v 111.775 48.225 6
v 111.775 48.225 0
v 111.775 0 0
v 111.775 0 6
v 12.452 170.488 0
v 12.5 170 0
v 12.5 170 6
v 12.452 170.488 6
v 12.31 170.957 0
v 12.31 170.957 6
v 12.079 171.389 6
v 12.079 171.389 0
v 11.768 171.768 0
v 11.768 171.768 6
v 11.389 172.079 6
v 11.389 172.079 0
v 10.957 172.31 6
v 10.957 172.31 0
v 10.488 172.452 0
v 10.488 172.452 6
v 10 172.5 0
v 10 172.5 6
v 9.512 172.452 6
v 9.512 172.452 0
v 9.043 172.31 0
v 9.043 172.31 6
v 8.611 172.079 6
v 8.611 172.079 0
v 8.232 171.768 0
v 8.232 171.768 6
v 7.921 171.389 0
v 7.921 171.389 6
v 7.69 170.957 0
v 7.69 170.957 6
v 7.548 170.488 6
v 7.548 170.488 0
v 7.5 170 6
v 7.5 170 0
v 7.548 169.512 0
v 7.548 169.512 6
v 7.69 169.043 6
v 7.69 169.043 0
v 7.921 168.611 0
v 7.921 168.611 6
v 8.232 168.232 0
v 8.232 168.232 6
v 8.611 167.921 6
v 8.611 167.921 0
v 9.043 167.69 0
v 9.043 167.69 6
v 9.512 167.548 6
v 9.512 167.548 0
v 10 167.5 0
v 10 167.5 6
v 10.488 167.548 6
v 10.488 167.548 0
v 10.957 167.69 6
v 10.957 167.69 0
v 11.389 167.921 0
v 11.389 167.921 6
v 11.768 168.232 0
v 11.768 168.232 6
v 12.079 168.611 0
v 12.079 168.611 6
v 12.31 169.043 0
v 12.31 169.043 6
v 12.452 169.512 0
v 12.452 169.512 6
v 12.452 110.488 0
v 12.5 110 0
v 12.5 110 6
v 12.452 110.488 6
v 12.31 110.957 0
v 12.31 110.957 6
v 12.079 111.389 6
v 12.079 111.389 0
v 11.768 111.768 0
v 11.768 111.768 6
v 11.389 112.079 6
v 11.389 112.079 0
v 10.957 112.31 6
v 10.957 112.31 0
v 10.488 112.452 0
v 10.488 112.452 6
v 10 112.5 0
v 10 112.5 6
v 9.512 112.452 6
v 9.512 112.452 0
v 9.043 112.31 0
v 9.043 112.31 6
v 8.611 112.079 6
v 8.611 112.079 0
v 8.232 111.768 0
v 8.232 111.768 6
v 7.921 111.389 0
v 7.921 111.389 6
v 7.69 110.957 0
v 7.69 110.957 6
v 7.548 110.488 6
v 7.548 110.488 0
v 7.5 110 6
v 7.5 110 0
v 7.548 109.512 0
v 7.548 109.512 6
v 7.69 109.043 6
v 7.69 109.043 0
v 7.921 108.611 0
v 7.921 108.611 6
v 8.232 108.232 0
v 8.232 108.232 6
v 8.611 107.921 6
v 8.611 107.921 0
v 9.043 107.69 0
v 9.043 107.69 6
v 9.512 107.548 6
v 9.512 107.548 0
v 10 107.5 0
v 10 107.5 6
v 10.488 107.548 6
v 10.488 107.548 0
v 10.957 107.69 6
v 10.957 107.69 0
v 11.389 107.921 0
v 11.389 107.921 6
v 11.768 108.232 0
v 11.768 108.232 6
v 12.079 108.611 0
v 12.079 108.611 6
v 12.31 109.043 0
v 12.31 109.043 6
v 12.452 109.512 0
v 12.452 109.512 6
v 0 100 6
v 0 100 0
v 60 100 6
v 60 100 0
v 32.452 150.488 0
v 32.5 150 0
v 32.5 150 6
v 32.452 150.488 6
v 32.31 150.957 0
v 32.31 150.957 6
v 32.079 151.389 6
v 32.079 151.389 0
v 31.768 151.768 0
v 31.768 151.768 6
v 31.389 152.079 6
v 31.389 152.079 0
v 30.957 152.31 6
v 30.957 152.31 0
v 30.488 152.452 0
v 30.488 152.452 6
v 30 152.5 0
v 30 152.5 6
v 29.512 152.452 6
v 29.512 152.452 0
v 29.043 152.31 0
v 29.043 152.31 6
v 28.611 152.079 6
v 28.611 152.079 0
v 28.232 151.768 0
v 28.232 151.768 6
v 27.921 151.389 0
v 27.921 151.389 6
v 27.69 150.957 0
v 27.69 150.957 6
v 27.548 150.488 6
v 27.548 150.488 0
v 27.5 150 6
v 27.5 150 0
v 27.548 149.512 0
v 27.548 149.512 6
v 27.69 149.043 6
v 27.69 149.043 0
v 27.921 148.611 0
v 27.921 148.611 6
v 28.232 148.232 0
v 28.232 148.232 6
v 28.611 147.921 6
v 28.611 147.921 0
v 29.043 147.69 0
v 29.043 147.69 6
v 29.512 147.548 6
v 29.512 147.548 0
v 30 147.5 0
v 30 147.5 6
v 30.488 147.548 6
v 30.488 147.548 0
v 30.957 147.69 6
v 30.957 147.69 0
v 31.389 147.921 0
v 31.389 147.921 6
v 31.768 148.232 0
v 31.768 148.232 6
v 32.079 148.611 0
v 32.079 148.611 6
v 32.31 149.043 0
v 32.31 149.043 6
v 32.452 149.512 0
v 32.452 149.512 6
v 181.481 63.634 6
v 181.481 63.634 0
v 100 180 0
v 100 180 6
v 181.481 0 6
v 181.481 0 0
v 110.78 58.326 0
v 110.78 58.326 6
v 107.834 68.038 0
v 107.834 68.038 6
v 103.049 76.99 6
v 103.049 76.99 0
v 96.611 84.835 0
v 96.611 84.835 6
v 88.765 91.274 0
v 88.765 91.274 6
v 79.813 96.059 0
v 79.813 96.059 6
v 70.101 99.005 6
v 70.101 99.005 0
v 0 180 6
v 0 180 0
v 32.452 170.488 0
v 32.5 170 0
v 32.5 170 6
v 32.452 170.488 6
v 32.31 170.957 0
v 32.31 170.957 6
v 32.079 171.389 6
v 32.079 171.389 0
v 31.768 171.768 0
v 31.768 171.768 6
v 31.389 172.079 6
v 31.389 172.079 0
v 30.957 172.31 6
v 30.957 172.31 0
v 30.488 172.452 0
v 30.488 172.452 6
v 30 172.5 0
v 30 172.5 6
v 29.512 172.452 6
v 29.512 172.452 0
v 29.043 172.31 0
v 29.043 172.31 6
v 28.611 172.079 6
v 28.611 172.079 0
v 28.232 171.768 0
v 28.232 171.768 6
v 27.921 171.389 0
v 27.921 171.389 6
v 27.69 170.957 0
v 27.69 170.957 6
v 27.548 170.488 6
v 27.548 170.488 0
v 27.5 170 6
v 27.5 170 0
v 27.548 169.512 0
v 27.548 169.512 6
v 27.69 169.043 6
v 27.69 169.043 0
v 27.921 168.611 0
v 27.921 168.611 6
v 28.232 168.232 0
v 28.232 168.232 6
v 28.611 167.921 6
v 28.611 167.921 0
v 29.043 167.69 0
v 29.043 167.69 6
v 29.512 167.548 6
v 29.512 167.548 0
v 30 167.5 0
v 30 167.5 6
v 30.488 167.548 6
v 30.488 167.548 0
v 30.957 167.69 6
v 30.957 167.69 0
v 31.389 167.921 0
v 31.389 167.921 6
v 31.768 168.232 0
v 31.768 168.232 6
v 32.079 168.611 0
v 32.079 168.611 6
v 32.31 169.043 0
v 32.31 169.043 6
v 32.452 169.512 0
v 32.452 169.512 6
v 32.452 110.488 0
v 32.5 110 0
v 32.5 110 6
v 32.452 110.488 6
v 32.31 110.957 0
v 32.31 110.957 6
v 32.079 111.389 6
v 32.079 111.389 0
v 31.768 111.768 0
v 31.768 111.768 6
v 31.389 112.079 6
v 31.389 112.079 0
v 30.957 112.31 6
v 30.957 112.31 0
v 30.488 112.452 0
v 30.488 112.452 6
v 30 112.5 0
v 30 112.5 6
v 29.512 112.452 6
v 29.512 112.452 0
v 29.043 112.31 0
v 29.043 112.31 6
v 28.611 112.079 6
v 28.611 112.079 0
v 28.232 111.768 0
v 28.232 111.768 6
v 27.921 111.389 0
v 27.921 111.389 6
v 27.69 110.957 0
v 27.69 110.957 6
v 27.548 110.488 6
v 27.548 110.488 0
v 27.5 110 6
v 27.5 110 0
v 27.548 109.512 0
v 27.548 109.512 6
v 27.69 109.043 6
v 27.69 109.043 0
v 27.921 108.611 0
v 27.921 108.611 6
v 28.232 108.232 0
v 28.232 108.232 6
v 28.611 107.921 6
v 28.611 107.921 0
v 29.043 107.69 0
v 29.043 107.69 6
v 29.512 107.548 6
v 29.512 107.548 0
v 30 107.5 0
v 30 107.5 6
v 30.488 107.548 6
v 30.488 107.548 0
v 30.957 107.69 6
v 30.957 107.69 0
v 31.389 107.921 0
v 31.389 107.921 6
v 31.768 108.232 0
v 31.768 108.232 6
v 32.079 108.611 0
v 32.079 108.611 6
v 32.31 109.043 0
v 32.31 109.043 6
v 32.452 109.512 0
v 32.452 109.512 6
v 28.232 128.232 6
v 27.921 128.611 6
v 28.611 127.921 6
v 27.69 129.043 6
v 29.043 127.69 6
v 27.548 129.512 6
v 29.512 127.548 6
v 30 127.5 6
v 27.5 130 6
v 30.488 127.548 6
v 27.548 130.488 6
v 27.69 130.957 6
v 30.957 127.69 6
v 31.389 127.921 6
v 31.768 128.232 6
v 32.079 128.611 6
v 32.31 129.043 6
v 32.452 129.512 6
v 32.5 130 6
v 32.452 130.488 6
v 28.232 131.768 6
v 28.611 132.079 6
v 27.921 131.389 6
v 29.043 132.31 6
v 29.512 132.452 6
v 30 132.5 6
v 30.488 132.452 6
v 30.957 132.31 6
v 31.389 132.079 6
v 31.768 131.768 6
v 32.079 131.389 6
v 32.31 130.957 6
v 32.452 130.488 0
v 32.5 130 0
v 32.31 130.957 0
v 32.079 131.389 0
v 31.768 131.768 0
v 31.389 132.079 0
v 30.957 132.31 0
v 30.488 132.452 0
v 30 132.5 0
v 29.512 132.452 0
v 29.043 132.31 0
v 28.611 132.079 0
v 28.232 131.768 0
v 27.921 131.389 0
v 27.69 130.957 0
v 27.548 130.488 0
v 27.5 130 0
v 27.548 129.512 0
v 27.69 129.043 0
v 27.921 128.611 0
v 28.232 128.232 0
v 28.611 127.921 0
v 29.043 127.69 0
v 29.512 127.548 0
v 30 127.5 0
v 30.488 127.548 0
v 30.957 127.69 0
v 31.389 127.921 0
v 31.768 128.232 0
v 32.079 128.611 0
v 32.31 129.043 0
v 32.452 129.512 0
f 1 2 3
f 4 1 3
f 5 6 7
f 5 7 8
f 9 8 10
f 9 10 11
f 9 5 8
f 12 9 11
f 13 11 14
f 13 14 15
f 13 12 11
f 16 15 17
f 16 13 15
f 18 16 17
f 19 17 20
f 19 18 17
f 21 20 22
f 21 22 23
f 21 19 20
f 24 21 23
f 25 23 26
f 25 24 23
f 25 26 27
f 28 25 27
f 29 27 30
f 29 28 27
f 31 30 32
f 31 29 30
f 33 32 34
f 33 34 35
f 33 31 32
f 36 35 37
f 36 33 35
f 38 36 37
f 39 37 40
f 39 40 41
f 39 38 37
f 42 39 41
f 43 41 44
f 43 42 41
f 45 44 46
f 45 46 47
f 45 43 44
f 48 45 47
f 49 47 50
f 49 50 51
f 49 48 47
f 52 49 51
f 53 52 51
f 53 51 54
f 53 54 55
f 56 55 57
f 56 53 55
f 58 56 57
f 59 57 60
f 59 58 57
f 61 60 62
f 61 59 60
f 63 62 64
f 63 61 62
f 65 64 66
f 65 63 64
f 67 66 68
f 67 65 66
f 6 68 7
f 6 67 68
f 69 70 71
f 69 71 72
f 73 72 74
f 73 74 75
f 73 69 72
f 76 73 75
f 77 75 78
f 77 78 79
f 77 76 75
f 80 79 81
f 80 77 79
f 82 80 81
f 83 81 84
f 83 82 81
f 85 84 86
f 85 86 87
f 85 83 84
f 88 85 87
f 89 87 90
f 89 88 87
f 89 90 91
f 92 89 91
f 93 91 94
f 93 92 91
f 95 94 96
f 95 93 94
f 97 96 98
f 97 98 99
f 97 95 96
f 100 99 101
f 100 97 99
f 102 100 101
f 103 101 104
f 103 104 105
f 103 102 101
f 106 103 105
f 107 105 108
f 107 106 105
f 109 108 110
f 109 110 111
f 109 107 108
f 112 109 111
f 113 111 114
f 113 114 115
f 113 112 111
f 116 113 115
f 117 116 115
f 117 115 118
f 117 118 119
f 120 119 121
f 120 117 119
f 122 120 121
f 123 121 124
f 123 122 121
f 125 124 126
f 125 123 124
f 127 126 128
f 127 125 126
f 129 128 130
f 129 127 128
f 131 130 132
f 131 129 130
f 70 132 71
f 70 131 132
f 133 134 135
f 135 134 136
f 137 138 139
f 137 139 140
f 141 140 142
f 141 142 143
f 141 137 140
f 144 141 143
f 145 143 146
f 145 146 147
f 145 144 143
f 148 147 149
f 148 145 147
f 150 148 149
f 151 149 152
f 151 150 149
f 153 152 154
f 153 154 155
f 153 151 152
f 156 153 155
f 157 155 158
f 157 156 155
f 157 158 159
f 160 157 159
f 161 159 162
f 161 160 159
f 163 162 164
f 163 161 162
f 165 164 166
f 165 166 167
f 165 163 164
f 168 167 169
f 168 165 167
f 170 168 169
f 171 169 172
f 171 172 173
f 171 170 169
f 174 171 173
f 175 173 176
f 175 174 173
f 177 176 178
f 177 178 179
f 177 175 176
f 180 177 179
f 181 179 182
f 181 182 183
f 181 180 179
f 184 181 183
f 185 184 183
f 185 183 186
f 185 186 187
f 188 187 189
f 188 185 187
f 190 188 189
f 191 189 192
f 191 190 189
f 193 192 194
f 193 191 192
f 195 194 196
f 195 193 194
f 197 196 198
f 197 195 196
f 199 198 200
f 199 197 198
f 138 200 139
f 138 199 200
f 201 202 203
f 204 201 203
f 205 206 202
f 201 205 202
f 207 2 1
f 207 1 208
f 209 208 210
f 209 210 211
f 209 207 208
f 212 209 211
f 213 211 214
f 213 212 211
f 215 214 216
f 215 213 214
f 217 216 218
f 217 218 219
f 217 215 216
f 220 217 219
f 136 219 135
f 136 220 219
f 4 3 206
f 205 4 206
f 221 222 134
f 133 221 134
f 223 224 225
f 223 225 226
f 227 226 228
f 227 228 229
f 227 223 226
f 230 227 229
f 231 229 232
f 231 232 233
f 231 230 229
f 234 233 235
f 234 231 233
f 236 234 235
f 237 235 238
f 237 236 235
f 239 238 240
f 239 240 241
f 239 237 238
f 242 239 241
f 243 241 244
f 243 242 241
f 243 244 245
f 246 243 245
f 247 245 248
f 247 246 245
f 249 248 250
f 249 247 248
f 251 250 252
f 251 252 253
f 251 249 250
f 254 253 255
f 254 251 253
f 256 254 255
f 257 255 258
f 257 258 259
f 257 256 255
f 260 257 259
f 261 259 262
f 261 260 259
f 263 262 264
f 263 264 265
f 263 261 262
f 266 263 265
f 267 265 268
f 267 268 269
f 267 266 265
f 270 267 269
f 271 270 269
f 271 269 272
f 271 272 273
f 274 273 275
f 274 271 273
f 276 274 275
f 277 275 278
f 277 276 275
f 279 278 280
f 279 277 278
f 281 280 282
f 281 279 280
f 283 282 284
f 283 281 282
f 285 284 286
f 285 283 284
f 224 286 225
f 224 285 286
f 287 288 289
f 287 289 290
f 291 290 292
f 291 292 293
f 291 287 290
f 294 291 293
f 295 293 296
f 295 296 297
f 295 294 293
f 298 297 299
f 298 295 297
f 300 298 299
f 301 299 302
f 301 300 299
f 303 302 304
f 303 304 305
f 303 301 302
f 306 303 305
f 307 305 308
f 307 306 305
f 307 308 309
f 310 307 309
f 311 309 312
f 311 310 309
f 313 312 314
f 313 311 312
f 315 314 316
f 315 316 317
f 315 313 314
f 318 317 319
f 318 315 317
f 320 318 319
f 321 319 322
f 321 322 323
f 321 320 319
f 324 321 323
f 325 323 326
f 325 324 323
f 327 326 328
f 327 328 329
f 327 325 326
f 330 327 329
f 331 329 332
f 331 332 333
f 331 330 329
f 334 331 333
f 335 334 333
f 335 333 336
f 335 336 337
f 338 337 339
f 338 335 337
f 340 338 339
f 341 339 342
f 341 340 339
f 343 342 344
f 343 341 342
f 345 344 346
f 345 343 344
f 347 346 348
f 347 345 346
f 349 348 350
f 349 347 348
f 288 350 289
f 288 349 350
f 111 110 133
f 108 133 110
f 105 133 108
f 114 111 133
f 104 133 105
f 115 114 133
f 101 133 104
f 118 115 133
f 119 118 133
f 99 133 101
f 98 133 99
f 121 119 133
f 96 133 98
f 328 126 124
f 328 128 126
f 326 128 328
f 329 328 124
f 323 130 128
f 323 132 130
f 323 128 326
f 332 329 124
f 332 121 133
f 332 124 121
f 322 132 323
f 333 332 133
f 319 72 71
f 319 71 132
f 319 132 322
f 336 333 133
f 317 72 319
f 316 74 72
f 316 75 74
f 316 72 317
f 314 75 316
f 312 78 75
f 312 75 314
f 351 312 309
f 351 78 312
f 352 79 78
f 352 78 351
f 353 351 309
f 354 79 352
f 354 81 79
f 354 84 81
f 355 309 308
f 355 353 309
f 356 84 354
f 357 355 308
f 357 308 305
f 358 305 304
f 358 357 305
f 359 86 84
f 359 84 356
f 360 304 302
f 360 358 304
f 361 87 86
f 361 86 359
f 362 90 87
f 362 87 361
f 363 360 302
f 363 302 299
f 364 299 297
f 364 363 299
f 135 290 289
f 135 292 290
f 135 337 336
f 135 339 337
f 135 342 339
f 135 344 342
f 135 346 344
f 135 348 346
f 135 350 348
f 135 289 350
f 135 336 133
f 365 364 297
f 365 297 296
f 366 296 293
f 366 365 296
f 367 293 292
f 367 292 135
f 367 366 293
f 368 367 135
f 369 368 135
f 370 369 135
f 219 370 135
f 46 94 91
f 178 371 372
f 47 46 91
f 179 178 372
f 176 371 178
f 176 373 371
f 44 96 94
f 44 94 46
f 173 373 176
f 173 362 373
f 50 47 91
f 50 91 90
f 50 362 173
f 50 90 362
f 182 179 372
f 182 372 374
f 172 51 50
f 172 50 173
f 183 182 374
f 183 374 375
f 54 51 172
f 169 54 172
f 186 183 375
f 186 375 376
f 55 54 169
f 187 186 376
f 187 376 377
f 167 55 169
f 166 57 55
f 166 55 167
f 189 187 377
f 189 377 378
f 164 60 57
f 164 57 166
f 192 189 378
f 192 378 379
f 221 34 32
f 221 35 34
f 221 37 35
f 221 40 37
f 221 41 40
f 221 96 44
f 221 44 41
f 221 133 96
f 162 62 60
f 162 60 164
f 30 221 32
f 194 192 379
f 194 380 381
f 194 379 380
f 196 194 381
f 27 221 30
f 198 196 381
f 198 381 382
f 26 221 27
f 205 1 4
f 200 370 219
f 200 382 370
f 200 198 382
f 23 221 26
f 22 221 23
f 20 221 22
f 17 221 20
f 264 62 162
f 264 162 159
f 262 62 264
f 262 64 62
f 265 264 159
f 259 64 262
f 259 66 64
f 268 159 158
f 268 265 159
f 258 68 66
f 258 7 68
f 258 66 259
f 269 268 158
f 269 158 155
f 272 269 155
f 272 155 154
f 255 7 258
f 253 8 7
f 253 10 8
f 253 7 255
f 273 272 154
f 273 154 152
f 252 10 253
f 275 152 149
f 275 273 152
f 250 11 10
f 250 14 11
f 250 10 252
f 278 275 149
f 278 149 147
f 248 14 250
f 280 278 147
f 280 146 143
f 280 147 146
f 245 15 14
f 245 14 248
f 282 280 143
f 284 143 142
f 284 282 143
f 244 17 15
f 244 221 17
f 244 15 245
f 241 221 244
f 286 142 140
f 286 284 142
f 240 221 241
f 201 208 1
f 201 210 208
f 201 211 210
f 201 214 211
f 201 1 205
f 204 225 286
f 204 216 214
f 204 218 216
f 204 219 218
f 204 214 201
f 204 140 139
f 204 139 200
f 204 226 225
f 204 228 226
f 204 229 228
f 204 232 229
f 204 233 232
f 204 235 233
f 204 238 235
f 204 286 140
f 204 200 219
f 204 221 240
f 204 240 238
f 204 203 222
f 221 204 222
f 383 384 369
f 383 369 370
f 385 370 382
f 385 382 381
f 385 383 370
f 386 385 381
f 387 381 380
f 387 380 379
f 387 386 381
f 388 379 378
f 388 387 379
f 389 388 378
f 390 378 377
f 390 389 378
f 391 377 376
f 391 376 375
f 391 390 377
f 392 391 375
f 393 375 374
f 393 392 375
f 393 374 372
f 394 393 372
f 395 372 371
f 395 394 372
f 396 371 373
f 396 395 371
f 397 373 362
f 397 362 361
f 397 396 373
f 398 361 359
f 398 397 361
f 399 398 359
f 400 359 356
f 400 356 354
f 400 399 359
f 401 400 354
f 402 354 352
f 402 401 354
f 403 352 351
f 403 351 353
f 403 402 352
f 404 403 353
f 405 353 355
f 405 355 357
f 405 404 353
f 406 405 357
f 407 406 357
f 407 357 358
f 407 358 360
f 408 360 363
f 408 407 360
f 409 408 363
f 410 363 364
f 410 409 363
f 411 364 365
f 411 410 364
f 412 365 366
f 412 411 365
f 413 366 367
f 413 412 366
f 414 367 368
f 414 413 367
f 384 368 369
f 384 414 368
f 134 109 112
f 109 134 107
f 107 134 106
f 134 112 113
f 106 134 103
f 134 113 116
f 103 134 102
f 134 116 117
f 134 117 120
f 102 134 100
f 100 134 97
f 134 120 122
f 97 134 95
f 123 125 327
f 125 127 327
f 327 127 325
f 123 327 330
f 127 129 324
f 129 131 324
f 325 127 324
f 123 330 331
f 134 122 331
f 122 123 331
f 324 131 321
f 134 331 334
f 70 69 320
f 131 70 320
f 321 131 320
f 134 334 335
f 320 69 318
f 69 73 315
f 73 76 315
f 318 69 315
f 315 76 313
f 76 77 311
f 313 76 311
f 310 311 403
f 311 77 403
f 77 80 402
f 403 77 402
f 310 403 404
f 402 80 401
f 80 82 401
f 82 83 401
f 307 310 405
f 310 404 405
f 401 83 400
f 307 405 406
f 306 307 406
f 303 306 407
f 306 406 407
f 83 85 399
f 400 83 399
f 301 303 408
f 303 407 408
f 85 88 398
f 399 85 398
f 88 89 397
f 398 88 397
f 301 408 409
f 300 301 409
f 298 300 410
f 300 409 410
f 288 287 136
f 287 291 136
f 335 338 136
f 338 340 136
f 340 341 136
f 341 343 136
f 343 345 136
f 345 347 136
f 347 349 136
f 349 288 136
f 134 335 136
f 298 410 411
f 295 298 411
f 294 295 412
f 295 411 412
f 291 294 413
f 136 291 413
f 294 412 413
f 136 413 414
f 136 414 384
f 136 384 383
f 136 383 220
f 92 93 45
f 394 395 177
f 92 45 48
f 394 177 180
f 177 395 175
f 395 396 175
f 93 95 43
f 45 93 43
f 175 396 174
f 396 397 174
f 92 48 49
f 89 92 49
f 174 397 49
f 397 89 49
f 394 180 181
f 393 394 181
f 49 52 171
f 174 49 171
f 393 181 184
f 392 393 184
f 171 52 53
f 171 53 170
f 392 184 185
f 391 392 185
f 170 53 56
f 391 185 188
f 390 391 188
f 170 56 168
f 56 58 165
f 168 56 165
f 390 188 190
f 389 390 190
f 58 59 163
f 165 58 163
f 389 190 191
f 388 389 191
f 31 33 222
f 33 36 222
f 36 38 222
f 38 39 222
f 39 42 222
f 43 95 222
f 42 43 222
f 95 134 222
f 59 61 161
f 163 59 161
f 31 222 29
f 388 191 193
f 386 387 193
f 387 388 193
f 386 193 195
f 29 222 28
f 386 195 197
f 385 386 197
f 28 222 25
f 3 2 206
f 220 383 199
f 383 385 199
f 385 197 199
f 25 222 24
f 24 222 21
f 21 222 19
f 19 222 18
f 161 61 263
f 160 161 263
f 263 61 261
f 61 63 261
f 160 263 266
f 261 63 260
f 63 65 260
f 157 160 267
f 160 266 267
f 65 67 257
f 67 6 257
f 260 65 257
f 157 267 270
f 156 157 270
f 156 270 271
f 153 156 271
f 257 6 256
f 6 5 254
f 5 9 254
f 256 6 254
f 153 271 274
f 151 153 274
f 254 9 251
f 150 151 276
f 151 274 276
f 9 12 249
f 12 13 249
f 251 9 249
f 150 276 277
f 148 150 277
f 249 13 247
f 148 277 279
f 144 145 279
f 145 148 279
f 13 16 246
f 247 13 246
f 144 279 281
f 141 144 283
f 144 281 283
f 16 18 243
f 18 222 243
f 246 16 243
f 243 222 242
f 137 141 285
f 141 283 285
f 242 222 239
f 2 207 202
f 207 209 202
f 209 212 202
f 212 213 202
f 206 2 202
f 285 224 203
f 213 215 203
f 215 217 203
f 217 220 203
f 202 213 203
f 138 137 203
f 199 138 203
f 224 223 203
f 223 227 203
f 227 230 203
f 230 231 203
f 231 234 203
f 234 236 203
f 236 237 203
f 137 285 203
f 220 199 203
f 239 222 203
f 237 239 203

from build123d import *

# Parameters (mm, degrees)
SKETCH_R  = 2.5
PAD_DEPTH = 6


with BuildPart() as part:
    # Sketch → Pad (new body)
    with BuildSketch(Plane.XY):
        with BuildLine():
            Line((181.480679, 0), (181.480679, 63.633531))
            Line((181.480679, 63.633531), (100, 180))
            Line((100, 180), (0, 180))
            Line((0, 180), (0, 100))
            Line((0, 100), (60, 100))
            ThreePointArc((111.77515, 48.22485), (96.61056, 84.83541), (60, 100))
            Line((111.77515, 48.22485), (111.77515, 0))
            Line((111.77515, 0), (181.480679, 0))
        make_face()
        with Locations((10, 170)):
            Circle(SKETCH_R, mode=Mode.SUBTRACT)
        with Locations((30, 170)):
            Circle(SKETCH_R, mode=Mode.SUBTRACT)
        with Locations((30, 150)):
            Circle(SKETCH_R, mode=Mode.SUBTRACT)
        with Locations((30, 130)):
            Circle(SKETCH_R, mode=Mode.SUBTRACT)
        with Locations((30, 110)):
            Circle(SKETCH_R, mode=Mode.SUBTRACT)
        with Locations((10, 110)):
            Circle(SKETCH_R, mode=Mode.SUBTRACT)
    extrude(amount=PAD_DEPTH)


solid = part.part
